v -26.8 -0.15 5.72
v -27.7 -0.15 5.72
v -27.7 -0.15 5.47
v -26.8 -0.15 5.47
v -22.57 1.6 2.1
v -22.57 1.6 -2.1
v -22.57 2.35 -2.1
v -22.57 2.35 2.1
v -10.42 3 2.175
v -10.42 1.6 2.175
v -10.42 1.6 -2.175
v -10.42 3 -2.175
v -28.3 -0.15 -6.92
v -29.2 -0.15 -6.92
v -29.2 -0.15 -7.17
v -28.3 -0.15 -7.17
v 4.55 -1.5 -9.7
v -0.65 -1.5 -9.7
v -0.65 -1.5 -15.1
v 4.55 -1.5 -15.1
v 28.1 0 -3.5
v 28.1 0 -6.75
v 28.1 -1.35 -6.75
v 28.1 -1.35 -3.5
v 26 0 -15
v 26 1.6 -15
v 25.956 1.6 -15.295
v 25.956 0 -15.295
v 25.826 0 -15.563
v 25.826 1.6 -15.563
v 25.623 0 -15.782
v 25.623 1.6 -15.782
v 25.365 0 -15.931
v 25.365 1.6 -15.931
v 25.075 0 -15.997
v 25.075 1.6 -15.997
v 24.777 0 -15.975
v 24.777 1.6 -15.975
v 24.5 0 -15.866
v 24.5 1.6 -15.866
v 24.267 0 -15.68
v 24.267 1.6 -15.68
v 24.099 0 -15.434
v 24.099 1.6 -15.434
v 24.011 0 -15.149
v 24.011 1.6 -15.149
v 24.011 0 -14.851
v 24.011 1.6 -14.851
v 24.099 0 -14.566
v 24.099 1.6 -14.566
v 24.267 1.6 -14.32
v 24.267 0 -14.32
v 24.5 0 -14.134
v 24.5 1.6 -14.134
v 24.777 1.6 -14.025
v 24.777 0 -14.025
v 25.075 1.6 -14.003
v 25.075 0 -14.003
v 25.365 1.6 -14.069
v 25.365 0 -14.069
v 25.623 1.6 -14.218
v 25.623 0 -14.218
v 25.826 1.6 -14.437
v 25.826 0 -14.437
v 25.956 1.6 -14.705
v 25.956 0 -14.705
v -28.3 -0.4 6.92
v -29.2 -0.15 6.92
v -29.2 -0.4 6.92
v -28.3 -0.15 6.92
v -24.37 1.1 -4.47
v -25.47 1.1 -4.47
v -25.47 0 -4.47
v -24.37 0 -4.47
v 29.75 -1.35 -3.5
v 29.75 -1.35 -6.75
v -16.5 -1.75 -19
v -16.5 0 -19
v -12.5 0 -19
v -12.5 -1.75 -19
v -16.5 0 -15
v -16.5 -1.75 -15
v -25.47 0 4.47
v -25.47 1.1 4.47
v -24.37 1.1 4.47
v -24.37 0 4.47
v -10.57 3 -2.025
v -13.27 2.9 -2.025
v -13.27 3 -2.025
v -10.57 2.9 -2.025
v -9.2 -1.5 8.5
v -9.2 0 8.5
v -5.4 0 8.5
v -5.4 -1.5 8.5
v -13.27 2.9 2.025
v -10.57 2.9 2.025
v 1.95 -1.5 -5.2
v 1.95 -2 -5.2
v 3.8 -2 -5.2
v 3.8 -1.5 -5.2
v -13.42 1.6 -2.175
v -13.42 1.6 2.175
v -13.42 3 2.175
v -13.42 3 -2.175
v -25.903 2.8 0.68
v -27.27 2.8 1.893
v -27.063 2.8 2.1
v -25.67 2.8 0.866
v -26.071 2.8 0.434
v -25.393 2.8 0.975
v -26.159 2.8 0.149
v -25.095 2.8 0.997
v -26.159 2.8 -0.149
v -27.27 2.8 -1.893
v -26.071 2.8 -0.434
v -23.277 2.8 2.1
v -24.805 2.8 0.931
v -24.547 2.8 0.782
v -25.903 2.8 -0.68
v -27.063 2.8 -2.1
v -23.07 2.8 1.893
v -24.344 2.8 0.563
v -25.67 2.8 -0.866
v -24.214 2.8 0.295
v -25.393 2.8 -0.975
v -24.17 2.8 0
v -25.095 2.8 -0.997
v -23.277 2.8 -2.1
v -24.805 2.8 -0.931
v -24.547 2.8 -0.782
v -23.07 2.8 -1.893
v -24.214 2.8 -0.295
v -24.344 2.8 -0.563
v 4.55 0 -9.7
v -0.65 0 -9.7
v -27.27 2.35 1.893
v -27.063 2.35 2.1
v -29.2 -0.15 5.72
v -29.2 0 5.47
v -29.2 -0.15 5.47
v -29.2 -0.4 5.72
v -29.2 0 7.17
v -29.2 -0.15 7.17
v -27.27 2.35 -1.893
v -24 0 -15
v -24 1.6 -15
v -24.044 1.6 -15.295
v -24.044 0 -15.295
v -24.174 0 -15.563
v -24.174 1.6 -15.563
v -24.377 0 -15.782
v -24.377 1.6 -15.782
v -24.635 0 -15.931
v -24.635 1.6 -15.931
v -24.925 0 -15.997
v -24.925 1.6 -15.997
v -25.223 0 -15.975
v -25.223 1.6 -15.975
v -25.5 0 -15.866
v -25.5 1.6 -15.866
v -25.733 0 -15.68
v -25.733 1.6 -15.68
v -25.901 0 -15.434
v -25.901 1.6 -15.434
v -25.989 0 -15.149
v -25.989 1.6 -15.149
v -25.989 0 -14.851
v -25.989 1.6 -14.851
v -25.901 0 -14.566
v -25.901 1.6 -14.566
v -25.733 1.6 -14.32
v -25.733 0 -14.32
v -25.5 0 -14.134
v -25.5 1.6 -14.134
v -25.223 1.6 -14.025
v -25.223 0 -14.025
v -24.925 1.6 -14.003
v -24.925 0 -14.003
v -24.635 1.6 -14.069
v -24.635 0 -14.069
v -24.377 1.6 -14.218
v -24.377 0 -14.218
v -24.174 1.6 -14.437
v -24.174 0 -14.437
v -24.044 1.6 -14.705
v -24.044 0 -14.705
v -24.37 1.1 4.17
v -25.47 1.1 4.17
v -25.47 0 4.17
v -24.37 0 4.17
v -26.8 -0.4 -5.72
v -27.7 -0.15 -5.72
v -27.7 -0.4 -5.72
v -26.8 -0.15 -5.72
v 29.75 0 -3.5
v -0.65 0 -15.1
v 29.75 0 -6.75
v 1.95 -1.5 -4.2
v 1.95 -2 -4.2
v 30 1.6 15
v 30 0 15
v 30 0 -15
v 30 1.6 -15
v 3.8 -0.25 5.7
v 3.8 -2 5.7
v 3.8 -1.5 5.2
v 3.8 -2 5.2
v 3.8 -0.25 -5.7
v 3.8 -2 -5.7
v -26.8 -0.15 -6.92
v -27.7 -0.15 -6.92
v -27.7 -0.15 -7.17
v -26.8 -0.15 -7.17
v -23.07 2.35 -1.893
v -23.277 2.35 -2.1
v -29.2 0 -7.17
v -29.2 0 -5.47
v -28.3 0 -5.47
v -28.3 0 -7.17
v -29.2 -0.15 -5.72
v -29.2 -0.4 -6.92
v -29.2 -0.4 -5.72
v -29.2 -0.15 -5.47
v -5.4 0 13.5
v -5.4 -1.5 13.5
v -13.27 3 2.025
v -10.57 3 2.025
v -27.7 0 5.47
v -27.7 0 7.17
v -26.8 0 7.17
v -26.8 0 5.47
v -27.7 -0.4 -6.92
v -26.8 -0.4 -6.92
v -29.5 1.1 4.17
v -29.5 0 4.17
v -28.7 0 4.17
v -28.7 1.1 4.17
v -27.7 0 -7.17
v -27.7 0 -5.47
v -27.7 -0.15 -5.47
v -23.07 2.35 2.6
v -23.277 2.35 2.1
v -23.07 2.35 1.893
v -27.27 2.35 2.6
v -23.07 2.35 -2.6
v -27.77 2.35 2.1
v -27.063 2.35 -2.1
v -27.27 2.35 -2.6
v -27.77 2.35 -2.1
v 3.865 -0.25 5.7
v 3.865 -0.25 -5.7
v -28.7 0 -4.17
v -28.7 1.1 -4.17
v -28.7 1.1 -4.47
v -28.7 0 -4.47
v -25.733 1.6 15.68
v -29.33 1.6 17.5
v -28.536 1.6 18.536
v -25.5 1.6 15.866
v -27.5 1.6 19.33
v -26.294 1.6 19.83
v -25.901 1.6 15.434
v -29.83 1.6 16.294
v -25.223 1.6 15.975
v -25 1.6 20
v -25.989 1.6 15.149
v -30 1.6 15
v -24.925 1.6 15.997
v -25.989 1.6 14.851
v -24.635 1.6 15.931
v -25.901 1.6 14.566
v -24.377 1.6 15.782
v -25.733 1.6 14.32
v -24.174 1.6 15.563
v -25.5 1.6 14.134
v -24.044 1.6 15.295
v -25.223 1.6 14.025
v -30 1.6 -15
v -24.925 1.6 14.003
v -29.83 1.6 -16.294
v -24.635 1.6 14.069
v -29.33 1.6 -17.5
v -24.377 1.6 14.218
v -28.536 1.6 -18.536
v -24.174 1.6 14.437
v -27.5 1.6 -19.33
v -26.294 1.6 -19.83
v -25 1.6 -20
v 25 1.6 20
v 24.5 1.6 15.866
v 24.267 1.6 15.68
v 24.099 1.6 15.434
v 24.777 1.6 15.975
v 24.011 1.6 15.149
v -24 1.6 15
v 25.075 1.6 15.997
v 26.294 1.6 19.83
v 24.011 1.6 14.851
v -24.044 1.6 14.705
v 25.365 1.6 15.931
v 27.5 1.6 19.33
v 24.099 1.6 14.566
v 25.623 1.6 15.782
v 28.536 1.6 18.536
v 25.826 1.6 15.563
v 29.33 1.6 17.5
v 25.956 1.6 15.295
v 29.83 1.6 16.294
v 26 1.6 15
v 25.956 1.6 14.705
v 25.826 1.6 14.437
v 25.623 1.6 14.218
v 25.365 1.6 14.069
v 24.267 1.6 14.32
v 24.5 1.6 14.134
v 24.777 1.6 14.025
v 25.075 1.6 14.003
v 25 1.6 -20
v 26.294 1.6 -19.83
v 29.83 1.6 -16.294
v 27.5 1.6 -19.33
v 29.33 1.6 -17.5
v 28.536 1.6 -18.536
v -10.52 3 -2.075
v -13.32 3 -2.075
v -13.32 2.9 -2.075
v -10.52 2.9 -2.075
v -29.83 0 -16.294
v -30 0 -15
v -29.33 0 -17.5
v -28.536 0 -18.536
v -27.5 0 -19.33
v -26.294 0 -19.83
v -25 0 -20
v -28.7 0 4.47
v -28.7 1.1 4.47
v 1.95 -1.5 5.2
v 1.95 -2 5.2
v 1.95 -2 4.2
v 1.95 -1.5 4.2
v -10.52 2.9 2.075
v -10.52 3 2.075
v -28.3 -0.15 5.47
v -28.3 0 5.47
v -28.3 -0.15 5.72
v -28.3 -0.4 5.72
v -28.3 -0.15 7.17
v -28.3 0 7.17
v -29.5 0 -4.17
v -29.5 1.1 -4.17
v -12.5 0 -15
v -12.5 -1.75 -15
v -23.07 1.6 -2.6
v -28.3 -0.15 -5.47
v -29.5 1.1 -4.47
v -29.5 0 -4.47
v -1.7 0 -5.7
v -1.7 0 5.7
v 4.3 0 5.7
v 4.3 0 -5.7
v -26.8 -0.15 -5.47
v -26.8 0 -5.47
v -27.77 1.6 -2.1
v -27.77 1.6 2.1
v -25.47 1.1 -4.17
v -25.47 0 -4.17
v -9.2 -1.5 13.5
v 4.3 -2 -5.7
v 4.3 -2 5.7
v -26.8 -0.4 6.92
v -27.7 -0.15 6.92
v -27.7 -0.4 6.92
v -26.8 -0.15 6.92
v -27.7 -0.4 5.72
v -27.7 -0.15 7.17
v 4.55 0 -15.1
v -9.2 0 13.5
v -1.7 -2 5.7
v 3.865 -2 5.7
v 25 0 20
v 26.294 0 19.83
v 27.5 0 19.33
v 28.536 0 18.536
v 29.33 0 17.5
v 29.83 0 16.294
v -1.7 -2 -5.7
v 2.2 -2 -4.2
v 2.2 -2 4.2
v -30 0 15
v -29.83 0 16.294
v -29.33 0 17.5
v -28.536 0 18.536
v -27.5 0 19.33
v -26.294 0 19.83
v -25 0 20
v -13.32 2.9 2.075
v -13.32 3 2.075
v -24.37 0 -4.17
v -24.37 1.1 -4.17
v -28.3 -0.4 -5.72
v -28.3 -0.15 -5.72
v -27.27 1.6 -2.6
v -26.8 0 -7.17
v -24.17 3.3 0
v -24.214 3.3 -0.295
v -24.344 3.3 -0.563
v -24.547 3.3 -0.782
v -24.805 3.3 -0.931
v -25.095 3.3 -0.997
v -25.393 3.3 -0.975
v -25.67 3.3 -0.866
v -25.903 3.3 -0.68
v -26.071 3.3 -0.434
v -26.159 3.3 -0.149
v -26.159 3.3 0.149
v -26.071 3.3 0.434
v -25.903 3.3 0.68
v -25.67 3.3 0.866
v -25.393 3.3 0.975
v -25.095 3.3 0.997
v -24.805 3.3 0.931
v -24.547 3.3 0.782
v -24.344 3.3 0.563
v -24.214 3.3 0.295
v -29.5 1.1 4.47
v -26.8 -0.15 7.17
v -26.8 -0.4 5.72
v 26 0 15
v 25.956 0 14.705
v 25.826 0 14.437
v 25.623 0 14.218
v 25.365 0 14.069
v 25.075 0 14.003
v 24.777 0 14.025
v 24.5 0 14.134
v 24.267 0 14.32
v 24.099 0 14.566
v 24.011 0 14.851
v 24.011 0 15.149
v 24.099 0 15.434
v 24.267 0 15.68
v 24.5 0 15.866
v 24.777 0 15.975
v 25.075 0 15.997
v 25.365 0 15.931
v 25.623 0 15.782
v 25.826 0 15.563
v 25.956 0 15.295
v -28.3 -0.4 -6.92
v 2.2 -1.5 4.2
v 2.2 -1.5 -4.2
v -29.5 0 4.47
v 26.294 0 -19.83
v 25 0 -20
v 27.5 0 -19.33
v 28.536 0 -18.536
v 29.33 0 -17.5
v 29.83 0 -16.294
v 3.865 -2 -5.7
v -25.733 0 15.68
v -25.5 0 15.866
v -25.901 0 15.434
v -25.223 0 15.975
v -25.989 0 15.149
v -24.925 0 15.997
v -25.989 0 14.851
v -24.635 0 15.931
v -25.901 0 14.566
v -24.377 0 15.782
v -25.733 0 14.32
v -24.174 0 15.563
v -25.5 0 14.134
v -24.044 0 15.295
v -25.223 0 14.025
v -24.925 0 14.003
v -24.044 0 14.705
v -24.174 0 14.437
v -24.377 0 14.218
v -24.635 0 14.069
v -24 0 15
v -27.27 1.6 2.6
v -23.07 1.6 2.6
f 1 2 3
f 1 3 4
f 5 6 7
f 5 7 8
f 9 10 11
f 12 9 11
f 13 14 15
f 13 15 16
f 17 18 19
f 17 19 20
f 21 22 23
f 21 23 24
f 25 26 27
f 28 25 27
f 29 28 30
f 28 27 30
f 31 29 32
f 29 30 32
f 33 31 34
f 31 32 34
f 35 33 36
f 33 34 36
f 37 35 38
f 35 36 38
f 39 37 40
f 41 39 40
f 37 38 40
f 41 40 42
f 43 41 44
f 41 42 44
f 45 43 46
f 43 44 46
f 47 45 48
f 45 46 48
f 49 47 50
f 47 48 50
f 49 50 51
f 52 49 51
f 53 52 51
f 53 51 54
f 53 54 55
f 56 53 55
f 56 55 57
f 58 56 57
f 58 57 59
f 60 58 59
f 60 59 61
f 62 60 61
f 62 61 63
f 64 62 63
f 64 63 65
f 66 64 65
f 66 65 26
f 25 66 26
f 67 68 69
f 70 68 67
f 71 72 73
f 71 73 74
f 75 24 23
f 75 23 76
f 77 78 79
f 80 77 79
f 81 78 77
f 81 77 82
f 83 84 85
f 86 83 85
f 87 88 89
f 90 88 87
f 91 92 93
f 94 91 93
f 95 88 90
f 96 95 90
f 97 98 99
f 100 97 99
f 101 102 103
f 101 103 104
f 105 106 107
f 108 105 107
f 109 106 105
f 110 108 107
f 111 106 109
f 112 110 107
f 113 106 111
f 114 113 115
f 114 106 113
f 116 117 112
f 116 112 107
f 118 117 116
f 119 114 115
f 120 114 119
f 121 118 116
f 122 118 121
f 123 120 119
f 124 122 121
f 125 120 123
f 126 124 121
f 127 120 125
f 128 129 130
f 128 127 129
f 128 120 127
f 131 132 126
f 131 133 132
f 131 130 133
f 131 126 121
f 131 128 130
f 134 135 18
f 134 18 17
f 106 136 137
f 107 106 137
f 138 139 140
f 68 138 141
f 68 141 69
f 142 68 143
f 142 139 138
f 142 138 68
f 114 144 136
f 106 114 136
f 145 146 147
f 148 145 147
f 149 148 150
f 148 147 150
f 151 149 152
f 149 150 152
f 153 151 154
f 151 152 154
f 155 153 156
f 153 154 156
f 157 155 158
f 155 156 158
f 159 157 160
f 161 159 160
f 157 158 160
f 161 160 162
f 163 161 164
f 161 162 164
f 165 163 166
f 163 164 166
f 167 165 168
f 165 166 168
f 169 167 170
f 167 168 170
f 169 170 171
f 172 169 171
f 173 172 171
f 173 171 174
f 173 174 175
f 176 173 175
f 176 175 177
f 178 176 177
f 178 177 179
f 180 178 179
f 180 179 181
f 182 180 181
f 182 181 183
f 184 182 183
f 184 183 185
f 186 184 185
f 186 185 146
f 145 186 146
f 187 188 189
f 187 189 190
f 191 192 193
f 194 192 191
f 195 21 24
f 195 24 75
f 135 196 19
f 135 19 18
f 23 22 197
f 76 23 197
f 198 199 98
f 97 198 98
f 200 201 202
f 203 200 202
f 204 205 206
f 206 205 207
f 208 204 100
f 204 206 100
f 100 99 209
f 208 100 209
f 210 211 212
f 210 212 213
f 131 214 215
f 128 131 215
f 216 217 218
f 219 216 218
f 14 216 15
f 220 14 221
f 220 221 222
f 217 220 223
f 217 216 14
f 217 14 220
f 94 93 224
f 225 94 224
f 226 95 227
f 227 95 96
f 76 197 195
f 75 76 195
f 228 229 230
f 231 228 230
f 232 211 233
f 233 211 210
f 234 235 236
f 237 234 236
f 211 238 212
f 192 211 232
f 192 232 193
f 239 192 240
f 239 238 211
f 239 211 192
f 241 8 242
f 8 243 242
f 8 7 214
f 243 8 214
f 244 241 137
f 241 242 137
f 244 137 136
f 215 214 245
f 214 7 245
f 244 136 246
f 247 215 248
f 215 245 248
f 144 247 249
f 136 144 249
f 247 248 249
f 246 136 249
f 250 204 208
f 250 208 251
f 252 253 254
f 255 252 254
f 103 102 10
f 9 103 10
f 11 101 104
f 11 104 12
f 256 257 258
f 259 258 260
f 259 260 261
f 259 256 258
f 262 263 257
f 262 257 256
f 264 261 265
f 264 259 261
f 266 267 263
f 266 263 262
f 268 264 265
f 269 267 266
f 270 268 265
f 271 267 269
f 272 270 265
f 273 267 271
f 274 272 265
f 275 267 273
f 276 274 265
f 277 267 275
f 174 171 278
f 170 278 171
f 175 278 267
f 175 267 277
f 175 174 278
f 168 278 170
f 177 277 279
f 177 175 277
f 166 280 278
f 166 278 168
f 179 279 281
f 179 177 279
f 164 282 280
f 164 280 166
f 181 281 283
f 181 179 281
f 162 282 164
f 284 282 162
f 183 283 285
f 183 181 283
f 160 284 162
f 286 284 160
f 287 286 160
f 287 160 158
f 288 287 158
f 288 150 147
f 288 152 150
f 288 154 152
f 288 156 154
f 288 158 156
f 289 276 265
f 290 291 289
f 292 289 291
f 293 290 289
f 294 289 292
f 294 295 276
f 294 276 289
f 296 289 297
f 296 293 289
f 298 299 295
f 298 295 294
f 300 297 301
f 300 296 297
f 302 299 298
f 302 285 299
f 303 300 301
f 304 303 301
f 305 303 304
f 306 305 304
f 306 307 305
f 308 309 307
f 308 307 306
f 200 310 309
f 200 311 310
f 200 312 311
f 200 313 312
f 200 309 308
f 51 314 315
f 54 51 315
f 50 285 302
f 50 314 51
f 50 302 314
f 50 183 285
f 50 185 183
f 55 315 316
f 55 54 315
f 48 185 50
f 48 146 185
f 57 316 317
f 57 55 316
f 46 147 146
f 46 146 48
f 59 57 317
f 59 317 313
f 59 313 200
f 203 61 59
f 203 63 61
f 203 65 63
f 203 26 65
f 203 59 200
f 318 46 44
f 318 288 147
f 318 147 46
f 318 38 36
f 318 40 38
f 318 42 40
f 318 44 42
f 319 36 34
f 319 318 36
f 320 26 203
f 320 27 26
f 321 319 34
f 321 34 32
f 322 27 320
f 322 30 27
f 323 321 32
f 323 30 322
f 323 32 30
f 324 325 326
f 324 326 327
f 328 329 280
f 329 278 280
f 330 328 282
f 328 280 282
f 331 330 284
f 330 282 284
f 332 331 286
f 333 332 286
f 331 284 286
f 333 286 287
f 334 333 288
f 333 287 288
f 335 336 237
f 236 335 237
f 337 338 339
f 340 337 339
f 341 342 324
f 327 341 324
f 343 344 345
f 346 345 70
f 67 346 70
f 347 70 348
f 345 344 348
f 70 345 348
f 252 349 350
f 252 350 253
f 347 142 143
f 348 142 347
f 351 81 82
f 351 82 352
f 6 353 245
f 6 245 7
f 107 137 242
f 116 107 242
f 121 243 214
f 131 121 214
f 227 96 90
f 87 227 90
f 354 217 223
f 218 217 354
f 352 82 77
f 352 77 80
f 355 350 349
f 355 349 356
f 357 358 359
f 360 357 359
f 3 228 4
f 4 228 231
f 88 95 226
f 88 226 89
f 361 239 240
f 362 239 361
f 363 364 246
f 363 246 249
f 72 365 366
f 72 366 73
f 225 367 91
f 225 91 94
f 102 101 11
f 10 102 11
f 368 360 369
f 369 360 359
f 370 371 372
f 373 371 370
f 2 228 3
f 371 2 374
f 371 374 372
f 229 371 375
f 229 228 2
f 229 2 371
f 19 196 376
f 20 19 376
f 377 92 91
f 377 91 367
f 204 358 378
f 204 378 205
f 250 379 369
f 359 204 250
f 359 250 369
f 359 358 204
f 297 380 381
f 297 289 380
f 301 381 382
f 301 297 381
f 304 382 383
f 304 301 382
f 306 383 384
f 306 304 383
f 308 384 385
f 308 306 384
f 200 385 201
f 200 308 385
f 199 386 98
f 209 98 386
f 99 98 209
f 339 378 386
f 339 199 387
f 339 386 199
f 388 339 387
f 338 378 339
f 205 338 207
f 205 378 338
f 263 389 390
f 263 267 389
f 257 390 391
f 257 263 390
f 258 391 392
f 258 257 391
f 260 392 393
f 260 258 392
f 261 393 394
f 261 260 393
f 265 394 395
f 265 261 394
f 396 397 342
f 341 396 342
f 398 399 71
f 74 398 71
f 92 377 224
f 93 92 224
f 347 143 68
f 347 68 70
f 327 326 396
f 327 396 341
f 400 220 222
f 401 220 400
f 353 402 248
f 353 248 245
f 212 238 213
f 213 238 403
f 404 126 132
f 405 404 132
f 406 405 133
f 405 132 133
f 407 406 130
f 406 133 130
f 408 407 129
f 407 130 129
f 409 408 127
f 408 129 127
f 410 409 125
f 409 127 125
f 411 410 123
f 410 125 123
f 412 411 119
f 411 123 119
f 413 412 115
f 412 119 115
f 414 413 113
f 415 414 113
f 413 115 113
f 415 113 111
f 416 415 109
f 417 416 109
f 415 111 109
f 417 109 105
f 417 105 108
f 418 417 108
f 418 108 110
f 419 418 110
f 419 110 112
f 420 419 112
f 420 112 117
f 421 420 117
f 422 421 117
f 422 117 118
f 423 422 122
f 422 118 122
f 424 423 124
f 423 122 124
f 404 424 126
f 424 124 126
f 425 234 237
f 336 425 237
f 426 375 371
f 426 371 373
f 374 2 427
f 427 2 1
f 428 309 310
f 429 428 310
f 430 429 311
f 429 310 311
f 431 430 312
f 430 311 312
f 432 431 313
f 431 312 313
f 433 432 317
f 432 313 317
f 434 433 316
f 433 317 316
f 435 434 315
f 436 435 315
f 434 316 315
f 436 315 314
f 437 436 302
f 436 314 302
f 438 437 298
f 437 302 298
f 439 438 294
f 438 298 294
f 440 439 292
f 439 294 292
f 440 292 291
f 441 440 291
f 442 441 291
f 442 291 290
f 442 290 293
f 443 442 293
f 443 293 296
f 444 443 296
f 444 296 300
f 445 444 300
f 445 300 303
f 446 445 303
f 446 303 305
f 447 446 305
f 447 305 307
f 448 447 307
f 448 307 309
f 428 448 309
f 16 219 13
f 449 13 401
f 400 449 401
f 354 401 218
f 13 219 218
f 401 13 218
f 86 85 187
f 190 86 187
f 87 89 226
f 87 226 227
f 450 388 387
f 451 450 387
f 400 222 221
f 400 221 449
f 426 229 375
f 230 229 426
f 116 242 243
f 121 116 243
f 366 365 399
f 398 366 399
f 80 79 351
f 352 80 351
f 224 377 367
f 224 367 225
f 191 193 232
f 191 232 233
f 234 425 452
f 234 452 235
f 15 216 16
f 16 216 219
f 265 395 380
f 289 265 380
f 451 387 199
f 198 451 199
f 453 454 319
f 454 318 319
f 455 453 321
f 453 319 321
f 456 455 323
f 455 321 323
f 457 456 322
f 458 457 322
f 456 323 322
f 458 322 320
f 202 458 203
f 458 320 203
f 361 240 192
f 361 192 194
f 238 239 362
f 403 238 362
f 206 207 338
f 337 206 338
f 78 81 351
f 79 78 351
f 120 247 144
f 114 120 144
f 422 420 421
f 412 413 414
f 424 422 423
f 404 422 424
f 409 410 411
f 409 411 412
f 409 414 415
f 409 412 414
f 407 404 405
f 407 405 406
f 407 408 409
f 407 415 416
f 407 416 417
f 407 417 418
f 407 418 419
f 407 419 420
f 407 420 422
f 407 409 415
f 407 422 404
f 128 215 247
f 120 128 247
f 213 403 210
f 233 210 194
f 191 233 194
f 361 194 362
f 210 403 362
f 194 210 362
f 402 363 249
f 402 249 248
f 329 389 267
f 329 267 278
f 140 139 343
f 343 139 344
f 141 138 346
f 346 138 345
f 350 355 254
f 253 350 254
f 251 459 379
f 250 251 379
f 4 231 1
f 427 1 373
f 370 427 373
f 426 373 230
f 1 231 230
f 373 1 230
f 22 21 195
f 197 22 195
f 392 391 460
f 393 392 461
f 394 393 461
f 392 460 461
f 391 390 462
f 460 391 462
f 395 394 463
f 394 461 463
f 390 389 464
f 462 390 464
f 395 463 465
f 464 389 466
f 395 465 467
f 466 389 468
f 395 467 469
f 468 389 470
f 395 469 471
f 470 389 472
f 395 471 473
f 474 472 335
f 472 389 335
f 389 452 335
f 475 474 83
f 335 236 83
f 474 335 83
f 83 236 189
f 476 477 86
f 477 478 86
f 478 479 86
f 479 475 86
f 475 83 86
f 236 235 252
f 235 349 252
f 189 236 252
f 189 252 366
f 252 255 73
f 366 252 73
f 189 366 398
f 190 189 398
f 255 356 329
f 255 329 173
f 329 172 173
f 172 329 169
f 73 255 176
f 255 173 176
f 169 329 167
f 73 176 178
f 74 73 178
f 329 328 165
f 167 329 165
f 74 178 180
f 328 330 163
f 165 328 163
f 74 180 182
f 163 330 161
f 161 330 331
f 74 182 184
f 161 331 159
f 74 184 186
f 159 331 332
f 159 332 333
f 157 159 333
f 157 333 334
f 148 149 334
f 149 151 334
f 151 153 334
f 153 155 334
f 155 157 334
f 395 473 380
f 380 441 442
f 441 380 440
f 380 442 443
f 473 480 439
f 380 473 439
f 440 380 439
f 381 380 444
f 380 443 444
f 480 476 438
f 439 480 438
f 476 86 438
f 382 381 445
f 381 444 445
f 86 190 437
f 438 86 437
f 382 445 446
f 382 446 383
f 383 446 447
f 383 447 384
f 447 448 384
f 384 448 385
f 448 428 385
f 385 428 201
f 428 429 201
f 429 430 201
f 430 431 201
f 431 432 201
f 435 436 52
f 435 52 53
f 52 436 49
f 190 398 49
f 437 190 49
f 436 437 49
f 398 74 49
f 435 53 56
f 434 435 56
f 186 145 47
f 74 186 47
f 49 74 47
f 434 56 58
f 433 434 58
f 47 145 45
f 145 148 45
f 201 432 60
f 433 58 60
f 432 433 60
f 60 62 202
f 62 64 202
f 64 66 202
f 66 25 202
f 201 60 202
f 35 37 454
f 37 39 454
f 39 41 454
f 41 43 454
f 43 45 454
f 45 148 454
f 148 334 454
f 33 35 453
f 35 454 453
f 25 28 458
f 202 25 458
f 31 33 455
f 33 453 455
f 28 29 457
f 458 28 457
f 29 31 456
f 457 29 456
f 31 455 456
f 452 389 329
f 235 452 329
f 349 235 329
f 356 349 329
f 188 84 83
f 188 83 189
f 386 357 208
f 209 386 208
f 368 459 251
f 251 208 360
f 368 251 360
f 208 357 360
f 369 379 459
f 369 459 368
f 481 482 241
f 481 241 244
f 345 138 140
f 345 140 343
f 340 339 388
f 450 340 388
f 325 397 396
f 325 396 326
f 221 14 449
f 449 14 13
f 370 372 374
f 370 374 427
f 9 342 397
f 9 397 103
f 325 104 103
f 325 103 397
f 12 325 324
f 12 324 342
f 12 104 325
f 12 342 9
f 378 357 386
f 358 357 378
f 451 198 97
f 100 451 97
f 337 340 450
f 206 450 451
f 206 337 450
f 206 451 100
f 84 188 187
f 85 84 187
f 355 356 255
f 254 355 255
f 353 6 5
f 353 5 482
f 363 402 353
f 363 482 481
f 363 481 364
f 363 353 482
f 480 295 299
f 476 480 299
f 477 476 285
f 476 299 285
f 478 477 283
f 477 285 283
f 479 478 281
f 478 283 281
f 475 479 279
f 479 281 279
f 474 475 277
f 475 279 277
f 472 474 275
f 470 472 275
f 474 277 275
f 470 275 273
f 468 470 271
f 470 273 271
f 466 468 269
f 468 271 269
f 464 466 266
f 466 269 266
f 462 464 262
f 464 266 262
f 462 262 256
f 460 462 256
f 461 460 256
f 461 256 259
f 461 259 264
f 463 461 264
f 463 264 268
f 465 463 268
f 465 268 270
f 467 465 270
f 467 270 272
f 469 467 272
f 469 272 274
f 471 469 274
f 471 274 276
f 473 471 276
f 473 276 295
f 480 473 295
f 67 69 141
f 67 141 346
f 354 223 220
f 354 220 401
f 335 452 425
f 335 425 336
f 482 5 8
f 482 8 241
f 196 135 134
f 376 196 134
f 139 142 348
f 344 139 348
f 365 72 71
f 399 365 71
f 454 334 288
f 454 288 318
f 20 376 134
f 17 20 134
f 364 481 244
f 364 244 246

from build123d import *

# Parameters (mm, degrees)
SKETCH1_W              = 60
SKETCH1_H              = 40
BOSS_EXTRUDE1_DEPTH    = 1.6
SKETCH2_R              = 1
CUT_EXTRUDE1_DEPTH     = 37.090996107
FILLET1_R              = 5
CUT_EXTRUDE2_START     = -0.5
SKETCH4_W              = 0.8
SKETCH4_H              = 0.3
SKETCH4_W_2            = 1.1
CUT_EXTRUDE2_DEPTH     = 36.590996107
SKETCH5_W              = 6
SKETCH5_H              = 11.4
BOSS_EXTRUDE2_DEPTH    = 2
CUT_EXTRUDE3_DEPTH     = 0.5
SKETCH6_3_W            = 0.064917345
SKETCH6_3_H            = 11.4
CUT_EXTRUDE4_DEPTH     = 1.75
BOSS_EXTRUDE3_DEPTH    = 0.75
BOSS_EXTRUDE4_DEPTH    = 0.45
SKETCH9_W              = 3
SKETCH9_H              = 4.35
BOSS_EXTRUDE6_DEPTH    = 1.4
SKETCH10_W             = 2.8
SKETCH10_H             = 4.15
CUT_EXTRUDE5_DEPTH     = 0.1
SKETCH11_W             = 2.7
SKETCH11_H             = 4.05
BOSS_EXTRUDE7_DEPTH    = 0.1
SKETCH13_W             = 4
SKETCH13_H             = 4
BOSS_EXTRUDE8_DEPTH    = 1.75
SKETCH14_W             = 5.2
SKETCH14_H             = 5.4
BOSS_EXTRUDE9_DEPTH    = 1.5
SKETCH15_W             = 3.8
SKETCH15_H             = 5
BOSS_EXTRUDE10_DEPTH   = 1.5
SKETCH16_W             = 1.65
SKETCH16_H             = 3.25
BOSS_EXTRUDE11_DEPTH   = 1.35
SKETCH17_R             = 1
BOSS_EXTRUDE12_DEPTH   = 0.5
SKETCH19_W             = 0.9
SKETCH19_H             = 1.7
BOSS_EXTRUDE13_DEPTH   = 0.15
BOSS_EXTRUDE13_2_DEPTH = 0.15
BOSS_EXTRUDE13_3_DEPTH = 0.15
BOSS_EXTRUDE13_4_DEPTH = 0.15
SKETCH20_W             = 0.9
SKETCH20_H             = 1.2
BOSS_EXTRUDE14_DEPTH   = 0.25


with BuildPart() as part:
    # Sketch1 → Boss-Extrude1 (new body)
    with BuildSketch(Plane(origin=(0, 0, 0), x_dir=(1, 0, 0), z_dir=(0, 1, 0))):
        Rectangle(SKETCH1_W, SKETCH1_H)
    extrude(amount=BOSS_EXTRUDE1_DEPTH)

    # Sketch2 → Cut-Extrude1 (cut, through all)
    with BuildSketch(Plane(origin=(0, 1.6, 0), x_dir=(1, 0, 0), z_dir=(0, 1, 0))):
        with Locations((-25, 15)):
            Circle(SKETCH2_R)
        with Locations((25, 15)):
            Circle(SKETCH2_R)
        with Locations((25, -15)):
            Circle(SKETCH2_R)
        with Locations((-25, -15)):
            Circle(SKETCH2_R)
    extrude(amount=-CUT_EXTRUDE1_DEPTH, mode=Mode.SUBTRACT)

    # Fillet1
    fillet1_edges = [part.edges().sort_by_distance(p)[0] for p in [
        (-30, 0.8, 20),
        (30, 0.8, 20),
        (30, 0.8, -20),
        (-30, 0.8, -20),
    ]]
    fillet(fillet1_edges, radius=FILLET1_R)

    # Sketch4 → Cut-Extrude2 (cut, through all)
    with BuildSketch(Plane(origin=(0, 1.6, 0), x_dir=(1, 0, 0), z_dir=(0, 1, 0)).offset(CUT_EXTRUDE2_START)):
        with Locations((-29.1, 4.32)):
            Rectangle(SKETCH4_W, SKETCH4_H)
        with Locations((-24.92, 4.32)):
            Rectangle(SKETCH4_W_2, SKETCH4_H)
        with Locations((-24.92, -4.32)):
            Rectangle(SKETCH4_W_2, SKETCH4_H)
        with Locations((-29.1, -4.32)):
            Rectangle(SKETCH4_W, SKETCH4_H)
    extrude(amount=-CUT_EXTRUDE2_DEPTH, mode=Mode.SUBTRACT)


with BuildPart() as body_2:
    # Sketch5 → Boss-Extrude2 (new body)
    with BuildSketch(Plane.XZ):
        with Locations((1.3, 0)):
            Rectangle(SKETCH5_W, SKETCH5_H)
    extrude(amount=BOSS_EXTRUDE2_DEPTH)

    # Sketch6 → Cut-Extrude3 (cut)
    with BuildSketch(Plane.XZ.offset(2)):
        Polygon((2.2, 4.2), (2.2, -4.2), (1.95, -4.2), (1.95, -5.2), (3.8, -5.2), (3.8, 5.2), (1.95, 5.2), (1.95, 4.2), align=None)
    extrude(amount=-CUT_EXTRUDE3_DEPTH, mode=Mode.SUBTRACT)

    # Sketch6<3> → Cut-Extrude4 (cut)
    with BuildSketch(Plane.XZ.offset(2)):
        with Locations((3.832458673, 0)):
            Rectangle(SKETCH6_3_W, SKETCH6_3_H)
    extrude(amount=-CUT_EXTRUDE4_DEPTH, mode=Mode.SUBTRACT)


with BuildPart() as body_3:
    # Sketch7 → Boss-Extrude3 (new body)
    with BuildSketch(Plane(origin=(0, 1.6, 0), x_dir=(1, 0, 0), z_dir=(0, 1, 0))):
        Polygon((-27.27, 2.6), (-23.07, 2.6), (-22.57, 2.1), (-22.57, -2.1), (-23.07, -2.6), (-27.27, -2.6), (-27.77, -2.1), (-27.77, 2.1), align=None)
    extrude(amount=BOSS_EXTRUDE3_DEPTH)

    # Sketch8 → Boss-Extrude4 (add)
    with BuildSketch(Plane(origin=(0, 2.35, 0), x_dir=(1, 0, 0), z_dir=(0, 1, 0))):
        Polygon((-23.277106781, 2.1), (-27.062893219, 2.1), (-27.27, 1.892893219), (-27.27, -1.892893219), (-27.062893219, -2.1), (-23.277106781, -2.1), (-23.07, -1.892893219), (-23.07, 1.892893219), align=None)
    extrude(amount=BOSS_EXTRUDE4_DEPTH)

    # Sketch17 → Boss-Extrude12 (add)
    with BuildSketch(Plane(origin=(0, 2.8, 0), x_dir=(1, 0, 0), z_dir=(0, 1, 0))):
        with Locations((-25.17, 0)):
            Circle(SKETCH17_R)
    extrude(amount=BOSS_EXTRUDE12_DEPTH)


with BuildPart() as body_4:
    # Sketch9 → Boss-Extrude6 (new body)
    with BuildSketch(Plane(origin=(0, 1.6, 0), x_dir=(1, 0, 0), z_dir=(0, 1, 0))):
        with Locations((-11.92, 0)):
            Rectangle(SKETCH9_W, SKETCH9_H)
    extrude(amount=BOSS_EXTRUDE6_DEPTH)

    # Sketch10 → Cut-Extrude5 (cut)
    with BuildSketch(Plane(origin=(0, 3, 0), x_dir=(1, 0, 0), z_dir=(0, 1, 0))):
        with Locations((-11.92, 0)):
            Rectangle(SKETCH10_W, SKETCH10_H)
    extrude(amount=-CUT_EXTRUDE5_DEPTH, mode=Mode.SUBTRACT)


with BuildPart() as body_5:
    # Sketch11 → Boss-Extrude7 (new body)
    with BuildSketch(Plane(origin=(0, 2.9, 0), x_dir=(1, 0, 0), z_dir=(0, 1, 0))):
        with Locations((-11.92, 0)):
            Rectangle(SKETCH11_W, SKETCH11_H)
    extrude(amount=BOSS_EXTRUDE7_DEPTH)


with BuildPart() as body_6:
    # Sketch13 → Boss-Extrude8 (new body)
    with BuildSketch(Plane.XZ):
        with Locations((-14.5, -17)):
            Rectangle(SKETCH13_W, SKETCH13_H)
    extrude(amount=BOSS_EXTRUDE8_DEPTH)


with BuildPart() as body_7:
    # Sketch14 → Boss-Extrude9 (new body)
    with BuildSketch(Plane.XZ):
        with Locations((1.95, -12.4)):
            Rectangle(SKETCH14_W, SKETCH14_H)
    extrude(amount=BOSS_EXTRUDE9_DEPTH)


with BuildPart() as body_8:
    # Sketch15 → Boss-Extrude10 (new body)
    with BuildSketch(Plane.XZ):
        with Locations((-7.3, 11)):
            Rectangle(SKETCH15_W, SKETCH15_H)
    extrude(amount=BOSS_EXTRUDE10_DEPTH)


with BuildPart() as body_9:
    # Sketch16 → Boss-Extrude11 (new body)
    with BuildSketch(Plane.XZ):
        with Locations((28.925, -5.125)):
            Rectangle(SKETCH16_W, SKETCH16_H)
    extrude(amount=BOSS_EXTRUDE11_DEPTH)


with BuildPart() as body_10:
    # Sketch19 → Boss-Extrude13 (new body)
    with BuildSketch(Plane.XZ):
        with Locations((-28.75, 6.32)):
            Rectangle(SKETCH19_W, SKETCH19_H)
    extrude(amount=BOSS_EXTRUDE13_DEPTH)



with BuildPart() as body_11:
    # Sketch19 → Boss-Extrude13 2 (new body)
    with BuildSketch(Plane.XZ):
        with Locations((-27.25, 6.32)):
            Rectangle(SKETCH19_W, SKETCH19_H)
    extrude(amount=BOSS_EXTRUDE13_2_DEPTH)


with BuildPart() as body_12:
    # Sketch19 → Boss-Extrude13 3 (new body)
    with BuildSketch(Plane.XZ):
        with Locations((-27.25, -6.32)):
            Rectangle(SKETCH19_W, SKETCH19_H)
    extrude(amount=BOSS_EXTRUDE13_3_DEPTH)


with BuildPart() as body_13:
    # Sketch19 → Boss-Extrude13 4 (new body)
    with BuildSketch(Plane.XZ):
        with Locations((-28.75, -6.32)):
            Rectangle(SKETCH19_W, SKETCH19_H)
    extrude(amount=BOSS_EXTRUDE13_4_DEPTH)


with BuildPart() as body_10_1:
    add(body_10.part)

    add(body_11.part)  # Boss-Extrude14 merges body 11

    add(body_12.part)  # Boss-Extrude14 merges body 12

    add(body_13.part)  # Boss-Extrude14 merges body 13
    # Sketch20 → Boss-Extrude14 (add)
    with BuildSketch(Plane.XZ.offset(0.15)):
        with Locations((-28.75, 6.32)):
            Rectangle(SKETCH20_W, SKETCH20_H)
        with Locations((-27.25, 6.32)):
            Rectangle(SKETCH20_W, SKETCH20_H)
        with Locations((-27.25, -6.32)):
            Rectangle(SKETCH20_W, SKETCH20_H)
        with Locations((-28.75, -6.32)):
            Rectangle(SKETCH20_W, SKETCH20_H)
    extrude(amount=BOSS_EXTRUDE14_DEPTH)


solid = Compound([part.part, body_2.part, body_3.part, body_4.part, body_5.part, body_6.part, body_7.part, body_8.part, body_9.part, body_10_1.part])
